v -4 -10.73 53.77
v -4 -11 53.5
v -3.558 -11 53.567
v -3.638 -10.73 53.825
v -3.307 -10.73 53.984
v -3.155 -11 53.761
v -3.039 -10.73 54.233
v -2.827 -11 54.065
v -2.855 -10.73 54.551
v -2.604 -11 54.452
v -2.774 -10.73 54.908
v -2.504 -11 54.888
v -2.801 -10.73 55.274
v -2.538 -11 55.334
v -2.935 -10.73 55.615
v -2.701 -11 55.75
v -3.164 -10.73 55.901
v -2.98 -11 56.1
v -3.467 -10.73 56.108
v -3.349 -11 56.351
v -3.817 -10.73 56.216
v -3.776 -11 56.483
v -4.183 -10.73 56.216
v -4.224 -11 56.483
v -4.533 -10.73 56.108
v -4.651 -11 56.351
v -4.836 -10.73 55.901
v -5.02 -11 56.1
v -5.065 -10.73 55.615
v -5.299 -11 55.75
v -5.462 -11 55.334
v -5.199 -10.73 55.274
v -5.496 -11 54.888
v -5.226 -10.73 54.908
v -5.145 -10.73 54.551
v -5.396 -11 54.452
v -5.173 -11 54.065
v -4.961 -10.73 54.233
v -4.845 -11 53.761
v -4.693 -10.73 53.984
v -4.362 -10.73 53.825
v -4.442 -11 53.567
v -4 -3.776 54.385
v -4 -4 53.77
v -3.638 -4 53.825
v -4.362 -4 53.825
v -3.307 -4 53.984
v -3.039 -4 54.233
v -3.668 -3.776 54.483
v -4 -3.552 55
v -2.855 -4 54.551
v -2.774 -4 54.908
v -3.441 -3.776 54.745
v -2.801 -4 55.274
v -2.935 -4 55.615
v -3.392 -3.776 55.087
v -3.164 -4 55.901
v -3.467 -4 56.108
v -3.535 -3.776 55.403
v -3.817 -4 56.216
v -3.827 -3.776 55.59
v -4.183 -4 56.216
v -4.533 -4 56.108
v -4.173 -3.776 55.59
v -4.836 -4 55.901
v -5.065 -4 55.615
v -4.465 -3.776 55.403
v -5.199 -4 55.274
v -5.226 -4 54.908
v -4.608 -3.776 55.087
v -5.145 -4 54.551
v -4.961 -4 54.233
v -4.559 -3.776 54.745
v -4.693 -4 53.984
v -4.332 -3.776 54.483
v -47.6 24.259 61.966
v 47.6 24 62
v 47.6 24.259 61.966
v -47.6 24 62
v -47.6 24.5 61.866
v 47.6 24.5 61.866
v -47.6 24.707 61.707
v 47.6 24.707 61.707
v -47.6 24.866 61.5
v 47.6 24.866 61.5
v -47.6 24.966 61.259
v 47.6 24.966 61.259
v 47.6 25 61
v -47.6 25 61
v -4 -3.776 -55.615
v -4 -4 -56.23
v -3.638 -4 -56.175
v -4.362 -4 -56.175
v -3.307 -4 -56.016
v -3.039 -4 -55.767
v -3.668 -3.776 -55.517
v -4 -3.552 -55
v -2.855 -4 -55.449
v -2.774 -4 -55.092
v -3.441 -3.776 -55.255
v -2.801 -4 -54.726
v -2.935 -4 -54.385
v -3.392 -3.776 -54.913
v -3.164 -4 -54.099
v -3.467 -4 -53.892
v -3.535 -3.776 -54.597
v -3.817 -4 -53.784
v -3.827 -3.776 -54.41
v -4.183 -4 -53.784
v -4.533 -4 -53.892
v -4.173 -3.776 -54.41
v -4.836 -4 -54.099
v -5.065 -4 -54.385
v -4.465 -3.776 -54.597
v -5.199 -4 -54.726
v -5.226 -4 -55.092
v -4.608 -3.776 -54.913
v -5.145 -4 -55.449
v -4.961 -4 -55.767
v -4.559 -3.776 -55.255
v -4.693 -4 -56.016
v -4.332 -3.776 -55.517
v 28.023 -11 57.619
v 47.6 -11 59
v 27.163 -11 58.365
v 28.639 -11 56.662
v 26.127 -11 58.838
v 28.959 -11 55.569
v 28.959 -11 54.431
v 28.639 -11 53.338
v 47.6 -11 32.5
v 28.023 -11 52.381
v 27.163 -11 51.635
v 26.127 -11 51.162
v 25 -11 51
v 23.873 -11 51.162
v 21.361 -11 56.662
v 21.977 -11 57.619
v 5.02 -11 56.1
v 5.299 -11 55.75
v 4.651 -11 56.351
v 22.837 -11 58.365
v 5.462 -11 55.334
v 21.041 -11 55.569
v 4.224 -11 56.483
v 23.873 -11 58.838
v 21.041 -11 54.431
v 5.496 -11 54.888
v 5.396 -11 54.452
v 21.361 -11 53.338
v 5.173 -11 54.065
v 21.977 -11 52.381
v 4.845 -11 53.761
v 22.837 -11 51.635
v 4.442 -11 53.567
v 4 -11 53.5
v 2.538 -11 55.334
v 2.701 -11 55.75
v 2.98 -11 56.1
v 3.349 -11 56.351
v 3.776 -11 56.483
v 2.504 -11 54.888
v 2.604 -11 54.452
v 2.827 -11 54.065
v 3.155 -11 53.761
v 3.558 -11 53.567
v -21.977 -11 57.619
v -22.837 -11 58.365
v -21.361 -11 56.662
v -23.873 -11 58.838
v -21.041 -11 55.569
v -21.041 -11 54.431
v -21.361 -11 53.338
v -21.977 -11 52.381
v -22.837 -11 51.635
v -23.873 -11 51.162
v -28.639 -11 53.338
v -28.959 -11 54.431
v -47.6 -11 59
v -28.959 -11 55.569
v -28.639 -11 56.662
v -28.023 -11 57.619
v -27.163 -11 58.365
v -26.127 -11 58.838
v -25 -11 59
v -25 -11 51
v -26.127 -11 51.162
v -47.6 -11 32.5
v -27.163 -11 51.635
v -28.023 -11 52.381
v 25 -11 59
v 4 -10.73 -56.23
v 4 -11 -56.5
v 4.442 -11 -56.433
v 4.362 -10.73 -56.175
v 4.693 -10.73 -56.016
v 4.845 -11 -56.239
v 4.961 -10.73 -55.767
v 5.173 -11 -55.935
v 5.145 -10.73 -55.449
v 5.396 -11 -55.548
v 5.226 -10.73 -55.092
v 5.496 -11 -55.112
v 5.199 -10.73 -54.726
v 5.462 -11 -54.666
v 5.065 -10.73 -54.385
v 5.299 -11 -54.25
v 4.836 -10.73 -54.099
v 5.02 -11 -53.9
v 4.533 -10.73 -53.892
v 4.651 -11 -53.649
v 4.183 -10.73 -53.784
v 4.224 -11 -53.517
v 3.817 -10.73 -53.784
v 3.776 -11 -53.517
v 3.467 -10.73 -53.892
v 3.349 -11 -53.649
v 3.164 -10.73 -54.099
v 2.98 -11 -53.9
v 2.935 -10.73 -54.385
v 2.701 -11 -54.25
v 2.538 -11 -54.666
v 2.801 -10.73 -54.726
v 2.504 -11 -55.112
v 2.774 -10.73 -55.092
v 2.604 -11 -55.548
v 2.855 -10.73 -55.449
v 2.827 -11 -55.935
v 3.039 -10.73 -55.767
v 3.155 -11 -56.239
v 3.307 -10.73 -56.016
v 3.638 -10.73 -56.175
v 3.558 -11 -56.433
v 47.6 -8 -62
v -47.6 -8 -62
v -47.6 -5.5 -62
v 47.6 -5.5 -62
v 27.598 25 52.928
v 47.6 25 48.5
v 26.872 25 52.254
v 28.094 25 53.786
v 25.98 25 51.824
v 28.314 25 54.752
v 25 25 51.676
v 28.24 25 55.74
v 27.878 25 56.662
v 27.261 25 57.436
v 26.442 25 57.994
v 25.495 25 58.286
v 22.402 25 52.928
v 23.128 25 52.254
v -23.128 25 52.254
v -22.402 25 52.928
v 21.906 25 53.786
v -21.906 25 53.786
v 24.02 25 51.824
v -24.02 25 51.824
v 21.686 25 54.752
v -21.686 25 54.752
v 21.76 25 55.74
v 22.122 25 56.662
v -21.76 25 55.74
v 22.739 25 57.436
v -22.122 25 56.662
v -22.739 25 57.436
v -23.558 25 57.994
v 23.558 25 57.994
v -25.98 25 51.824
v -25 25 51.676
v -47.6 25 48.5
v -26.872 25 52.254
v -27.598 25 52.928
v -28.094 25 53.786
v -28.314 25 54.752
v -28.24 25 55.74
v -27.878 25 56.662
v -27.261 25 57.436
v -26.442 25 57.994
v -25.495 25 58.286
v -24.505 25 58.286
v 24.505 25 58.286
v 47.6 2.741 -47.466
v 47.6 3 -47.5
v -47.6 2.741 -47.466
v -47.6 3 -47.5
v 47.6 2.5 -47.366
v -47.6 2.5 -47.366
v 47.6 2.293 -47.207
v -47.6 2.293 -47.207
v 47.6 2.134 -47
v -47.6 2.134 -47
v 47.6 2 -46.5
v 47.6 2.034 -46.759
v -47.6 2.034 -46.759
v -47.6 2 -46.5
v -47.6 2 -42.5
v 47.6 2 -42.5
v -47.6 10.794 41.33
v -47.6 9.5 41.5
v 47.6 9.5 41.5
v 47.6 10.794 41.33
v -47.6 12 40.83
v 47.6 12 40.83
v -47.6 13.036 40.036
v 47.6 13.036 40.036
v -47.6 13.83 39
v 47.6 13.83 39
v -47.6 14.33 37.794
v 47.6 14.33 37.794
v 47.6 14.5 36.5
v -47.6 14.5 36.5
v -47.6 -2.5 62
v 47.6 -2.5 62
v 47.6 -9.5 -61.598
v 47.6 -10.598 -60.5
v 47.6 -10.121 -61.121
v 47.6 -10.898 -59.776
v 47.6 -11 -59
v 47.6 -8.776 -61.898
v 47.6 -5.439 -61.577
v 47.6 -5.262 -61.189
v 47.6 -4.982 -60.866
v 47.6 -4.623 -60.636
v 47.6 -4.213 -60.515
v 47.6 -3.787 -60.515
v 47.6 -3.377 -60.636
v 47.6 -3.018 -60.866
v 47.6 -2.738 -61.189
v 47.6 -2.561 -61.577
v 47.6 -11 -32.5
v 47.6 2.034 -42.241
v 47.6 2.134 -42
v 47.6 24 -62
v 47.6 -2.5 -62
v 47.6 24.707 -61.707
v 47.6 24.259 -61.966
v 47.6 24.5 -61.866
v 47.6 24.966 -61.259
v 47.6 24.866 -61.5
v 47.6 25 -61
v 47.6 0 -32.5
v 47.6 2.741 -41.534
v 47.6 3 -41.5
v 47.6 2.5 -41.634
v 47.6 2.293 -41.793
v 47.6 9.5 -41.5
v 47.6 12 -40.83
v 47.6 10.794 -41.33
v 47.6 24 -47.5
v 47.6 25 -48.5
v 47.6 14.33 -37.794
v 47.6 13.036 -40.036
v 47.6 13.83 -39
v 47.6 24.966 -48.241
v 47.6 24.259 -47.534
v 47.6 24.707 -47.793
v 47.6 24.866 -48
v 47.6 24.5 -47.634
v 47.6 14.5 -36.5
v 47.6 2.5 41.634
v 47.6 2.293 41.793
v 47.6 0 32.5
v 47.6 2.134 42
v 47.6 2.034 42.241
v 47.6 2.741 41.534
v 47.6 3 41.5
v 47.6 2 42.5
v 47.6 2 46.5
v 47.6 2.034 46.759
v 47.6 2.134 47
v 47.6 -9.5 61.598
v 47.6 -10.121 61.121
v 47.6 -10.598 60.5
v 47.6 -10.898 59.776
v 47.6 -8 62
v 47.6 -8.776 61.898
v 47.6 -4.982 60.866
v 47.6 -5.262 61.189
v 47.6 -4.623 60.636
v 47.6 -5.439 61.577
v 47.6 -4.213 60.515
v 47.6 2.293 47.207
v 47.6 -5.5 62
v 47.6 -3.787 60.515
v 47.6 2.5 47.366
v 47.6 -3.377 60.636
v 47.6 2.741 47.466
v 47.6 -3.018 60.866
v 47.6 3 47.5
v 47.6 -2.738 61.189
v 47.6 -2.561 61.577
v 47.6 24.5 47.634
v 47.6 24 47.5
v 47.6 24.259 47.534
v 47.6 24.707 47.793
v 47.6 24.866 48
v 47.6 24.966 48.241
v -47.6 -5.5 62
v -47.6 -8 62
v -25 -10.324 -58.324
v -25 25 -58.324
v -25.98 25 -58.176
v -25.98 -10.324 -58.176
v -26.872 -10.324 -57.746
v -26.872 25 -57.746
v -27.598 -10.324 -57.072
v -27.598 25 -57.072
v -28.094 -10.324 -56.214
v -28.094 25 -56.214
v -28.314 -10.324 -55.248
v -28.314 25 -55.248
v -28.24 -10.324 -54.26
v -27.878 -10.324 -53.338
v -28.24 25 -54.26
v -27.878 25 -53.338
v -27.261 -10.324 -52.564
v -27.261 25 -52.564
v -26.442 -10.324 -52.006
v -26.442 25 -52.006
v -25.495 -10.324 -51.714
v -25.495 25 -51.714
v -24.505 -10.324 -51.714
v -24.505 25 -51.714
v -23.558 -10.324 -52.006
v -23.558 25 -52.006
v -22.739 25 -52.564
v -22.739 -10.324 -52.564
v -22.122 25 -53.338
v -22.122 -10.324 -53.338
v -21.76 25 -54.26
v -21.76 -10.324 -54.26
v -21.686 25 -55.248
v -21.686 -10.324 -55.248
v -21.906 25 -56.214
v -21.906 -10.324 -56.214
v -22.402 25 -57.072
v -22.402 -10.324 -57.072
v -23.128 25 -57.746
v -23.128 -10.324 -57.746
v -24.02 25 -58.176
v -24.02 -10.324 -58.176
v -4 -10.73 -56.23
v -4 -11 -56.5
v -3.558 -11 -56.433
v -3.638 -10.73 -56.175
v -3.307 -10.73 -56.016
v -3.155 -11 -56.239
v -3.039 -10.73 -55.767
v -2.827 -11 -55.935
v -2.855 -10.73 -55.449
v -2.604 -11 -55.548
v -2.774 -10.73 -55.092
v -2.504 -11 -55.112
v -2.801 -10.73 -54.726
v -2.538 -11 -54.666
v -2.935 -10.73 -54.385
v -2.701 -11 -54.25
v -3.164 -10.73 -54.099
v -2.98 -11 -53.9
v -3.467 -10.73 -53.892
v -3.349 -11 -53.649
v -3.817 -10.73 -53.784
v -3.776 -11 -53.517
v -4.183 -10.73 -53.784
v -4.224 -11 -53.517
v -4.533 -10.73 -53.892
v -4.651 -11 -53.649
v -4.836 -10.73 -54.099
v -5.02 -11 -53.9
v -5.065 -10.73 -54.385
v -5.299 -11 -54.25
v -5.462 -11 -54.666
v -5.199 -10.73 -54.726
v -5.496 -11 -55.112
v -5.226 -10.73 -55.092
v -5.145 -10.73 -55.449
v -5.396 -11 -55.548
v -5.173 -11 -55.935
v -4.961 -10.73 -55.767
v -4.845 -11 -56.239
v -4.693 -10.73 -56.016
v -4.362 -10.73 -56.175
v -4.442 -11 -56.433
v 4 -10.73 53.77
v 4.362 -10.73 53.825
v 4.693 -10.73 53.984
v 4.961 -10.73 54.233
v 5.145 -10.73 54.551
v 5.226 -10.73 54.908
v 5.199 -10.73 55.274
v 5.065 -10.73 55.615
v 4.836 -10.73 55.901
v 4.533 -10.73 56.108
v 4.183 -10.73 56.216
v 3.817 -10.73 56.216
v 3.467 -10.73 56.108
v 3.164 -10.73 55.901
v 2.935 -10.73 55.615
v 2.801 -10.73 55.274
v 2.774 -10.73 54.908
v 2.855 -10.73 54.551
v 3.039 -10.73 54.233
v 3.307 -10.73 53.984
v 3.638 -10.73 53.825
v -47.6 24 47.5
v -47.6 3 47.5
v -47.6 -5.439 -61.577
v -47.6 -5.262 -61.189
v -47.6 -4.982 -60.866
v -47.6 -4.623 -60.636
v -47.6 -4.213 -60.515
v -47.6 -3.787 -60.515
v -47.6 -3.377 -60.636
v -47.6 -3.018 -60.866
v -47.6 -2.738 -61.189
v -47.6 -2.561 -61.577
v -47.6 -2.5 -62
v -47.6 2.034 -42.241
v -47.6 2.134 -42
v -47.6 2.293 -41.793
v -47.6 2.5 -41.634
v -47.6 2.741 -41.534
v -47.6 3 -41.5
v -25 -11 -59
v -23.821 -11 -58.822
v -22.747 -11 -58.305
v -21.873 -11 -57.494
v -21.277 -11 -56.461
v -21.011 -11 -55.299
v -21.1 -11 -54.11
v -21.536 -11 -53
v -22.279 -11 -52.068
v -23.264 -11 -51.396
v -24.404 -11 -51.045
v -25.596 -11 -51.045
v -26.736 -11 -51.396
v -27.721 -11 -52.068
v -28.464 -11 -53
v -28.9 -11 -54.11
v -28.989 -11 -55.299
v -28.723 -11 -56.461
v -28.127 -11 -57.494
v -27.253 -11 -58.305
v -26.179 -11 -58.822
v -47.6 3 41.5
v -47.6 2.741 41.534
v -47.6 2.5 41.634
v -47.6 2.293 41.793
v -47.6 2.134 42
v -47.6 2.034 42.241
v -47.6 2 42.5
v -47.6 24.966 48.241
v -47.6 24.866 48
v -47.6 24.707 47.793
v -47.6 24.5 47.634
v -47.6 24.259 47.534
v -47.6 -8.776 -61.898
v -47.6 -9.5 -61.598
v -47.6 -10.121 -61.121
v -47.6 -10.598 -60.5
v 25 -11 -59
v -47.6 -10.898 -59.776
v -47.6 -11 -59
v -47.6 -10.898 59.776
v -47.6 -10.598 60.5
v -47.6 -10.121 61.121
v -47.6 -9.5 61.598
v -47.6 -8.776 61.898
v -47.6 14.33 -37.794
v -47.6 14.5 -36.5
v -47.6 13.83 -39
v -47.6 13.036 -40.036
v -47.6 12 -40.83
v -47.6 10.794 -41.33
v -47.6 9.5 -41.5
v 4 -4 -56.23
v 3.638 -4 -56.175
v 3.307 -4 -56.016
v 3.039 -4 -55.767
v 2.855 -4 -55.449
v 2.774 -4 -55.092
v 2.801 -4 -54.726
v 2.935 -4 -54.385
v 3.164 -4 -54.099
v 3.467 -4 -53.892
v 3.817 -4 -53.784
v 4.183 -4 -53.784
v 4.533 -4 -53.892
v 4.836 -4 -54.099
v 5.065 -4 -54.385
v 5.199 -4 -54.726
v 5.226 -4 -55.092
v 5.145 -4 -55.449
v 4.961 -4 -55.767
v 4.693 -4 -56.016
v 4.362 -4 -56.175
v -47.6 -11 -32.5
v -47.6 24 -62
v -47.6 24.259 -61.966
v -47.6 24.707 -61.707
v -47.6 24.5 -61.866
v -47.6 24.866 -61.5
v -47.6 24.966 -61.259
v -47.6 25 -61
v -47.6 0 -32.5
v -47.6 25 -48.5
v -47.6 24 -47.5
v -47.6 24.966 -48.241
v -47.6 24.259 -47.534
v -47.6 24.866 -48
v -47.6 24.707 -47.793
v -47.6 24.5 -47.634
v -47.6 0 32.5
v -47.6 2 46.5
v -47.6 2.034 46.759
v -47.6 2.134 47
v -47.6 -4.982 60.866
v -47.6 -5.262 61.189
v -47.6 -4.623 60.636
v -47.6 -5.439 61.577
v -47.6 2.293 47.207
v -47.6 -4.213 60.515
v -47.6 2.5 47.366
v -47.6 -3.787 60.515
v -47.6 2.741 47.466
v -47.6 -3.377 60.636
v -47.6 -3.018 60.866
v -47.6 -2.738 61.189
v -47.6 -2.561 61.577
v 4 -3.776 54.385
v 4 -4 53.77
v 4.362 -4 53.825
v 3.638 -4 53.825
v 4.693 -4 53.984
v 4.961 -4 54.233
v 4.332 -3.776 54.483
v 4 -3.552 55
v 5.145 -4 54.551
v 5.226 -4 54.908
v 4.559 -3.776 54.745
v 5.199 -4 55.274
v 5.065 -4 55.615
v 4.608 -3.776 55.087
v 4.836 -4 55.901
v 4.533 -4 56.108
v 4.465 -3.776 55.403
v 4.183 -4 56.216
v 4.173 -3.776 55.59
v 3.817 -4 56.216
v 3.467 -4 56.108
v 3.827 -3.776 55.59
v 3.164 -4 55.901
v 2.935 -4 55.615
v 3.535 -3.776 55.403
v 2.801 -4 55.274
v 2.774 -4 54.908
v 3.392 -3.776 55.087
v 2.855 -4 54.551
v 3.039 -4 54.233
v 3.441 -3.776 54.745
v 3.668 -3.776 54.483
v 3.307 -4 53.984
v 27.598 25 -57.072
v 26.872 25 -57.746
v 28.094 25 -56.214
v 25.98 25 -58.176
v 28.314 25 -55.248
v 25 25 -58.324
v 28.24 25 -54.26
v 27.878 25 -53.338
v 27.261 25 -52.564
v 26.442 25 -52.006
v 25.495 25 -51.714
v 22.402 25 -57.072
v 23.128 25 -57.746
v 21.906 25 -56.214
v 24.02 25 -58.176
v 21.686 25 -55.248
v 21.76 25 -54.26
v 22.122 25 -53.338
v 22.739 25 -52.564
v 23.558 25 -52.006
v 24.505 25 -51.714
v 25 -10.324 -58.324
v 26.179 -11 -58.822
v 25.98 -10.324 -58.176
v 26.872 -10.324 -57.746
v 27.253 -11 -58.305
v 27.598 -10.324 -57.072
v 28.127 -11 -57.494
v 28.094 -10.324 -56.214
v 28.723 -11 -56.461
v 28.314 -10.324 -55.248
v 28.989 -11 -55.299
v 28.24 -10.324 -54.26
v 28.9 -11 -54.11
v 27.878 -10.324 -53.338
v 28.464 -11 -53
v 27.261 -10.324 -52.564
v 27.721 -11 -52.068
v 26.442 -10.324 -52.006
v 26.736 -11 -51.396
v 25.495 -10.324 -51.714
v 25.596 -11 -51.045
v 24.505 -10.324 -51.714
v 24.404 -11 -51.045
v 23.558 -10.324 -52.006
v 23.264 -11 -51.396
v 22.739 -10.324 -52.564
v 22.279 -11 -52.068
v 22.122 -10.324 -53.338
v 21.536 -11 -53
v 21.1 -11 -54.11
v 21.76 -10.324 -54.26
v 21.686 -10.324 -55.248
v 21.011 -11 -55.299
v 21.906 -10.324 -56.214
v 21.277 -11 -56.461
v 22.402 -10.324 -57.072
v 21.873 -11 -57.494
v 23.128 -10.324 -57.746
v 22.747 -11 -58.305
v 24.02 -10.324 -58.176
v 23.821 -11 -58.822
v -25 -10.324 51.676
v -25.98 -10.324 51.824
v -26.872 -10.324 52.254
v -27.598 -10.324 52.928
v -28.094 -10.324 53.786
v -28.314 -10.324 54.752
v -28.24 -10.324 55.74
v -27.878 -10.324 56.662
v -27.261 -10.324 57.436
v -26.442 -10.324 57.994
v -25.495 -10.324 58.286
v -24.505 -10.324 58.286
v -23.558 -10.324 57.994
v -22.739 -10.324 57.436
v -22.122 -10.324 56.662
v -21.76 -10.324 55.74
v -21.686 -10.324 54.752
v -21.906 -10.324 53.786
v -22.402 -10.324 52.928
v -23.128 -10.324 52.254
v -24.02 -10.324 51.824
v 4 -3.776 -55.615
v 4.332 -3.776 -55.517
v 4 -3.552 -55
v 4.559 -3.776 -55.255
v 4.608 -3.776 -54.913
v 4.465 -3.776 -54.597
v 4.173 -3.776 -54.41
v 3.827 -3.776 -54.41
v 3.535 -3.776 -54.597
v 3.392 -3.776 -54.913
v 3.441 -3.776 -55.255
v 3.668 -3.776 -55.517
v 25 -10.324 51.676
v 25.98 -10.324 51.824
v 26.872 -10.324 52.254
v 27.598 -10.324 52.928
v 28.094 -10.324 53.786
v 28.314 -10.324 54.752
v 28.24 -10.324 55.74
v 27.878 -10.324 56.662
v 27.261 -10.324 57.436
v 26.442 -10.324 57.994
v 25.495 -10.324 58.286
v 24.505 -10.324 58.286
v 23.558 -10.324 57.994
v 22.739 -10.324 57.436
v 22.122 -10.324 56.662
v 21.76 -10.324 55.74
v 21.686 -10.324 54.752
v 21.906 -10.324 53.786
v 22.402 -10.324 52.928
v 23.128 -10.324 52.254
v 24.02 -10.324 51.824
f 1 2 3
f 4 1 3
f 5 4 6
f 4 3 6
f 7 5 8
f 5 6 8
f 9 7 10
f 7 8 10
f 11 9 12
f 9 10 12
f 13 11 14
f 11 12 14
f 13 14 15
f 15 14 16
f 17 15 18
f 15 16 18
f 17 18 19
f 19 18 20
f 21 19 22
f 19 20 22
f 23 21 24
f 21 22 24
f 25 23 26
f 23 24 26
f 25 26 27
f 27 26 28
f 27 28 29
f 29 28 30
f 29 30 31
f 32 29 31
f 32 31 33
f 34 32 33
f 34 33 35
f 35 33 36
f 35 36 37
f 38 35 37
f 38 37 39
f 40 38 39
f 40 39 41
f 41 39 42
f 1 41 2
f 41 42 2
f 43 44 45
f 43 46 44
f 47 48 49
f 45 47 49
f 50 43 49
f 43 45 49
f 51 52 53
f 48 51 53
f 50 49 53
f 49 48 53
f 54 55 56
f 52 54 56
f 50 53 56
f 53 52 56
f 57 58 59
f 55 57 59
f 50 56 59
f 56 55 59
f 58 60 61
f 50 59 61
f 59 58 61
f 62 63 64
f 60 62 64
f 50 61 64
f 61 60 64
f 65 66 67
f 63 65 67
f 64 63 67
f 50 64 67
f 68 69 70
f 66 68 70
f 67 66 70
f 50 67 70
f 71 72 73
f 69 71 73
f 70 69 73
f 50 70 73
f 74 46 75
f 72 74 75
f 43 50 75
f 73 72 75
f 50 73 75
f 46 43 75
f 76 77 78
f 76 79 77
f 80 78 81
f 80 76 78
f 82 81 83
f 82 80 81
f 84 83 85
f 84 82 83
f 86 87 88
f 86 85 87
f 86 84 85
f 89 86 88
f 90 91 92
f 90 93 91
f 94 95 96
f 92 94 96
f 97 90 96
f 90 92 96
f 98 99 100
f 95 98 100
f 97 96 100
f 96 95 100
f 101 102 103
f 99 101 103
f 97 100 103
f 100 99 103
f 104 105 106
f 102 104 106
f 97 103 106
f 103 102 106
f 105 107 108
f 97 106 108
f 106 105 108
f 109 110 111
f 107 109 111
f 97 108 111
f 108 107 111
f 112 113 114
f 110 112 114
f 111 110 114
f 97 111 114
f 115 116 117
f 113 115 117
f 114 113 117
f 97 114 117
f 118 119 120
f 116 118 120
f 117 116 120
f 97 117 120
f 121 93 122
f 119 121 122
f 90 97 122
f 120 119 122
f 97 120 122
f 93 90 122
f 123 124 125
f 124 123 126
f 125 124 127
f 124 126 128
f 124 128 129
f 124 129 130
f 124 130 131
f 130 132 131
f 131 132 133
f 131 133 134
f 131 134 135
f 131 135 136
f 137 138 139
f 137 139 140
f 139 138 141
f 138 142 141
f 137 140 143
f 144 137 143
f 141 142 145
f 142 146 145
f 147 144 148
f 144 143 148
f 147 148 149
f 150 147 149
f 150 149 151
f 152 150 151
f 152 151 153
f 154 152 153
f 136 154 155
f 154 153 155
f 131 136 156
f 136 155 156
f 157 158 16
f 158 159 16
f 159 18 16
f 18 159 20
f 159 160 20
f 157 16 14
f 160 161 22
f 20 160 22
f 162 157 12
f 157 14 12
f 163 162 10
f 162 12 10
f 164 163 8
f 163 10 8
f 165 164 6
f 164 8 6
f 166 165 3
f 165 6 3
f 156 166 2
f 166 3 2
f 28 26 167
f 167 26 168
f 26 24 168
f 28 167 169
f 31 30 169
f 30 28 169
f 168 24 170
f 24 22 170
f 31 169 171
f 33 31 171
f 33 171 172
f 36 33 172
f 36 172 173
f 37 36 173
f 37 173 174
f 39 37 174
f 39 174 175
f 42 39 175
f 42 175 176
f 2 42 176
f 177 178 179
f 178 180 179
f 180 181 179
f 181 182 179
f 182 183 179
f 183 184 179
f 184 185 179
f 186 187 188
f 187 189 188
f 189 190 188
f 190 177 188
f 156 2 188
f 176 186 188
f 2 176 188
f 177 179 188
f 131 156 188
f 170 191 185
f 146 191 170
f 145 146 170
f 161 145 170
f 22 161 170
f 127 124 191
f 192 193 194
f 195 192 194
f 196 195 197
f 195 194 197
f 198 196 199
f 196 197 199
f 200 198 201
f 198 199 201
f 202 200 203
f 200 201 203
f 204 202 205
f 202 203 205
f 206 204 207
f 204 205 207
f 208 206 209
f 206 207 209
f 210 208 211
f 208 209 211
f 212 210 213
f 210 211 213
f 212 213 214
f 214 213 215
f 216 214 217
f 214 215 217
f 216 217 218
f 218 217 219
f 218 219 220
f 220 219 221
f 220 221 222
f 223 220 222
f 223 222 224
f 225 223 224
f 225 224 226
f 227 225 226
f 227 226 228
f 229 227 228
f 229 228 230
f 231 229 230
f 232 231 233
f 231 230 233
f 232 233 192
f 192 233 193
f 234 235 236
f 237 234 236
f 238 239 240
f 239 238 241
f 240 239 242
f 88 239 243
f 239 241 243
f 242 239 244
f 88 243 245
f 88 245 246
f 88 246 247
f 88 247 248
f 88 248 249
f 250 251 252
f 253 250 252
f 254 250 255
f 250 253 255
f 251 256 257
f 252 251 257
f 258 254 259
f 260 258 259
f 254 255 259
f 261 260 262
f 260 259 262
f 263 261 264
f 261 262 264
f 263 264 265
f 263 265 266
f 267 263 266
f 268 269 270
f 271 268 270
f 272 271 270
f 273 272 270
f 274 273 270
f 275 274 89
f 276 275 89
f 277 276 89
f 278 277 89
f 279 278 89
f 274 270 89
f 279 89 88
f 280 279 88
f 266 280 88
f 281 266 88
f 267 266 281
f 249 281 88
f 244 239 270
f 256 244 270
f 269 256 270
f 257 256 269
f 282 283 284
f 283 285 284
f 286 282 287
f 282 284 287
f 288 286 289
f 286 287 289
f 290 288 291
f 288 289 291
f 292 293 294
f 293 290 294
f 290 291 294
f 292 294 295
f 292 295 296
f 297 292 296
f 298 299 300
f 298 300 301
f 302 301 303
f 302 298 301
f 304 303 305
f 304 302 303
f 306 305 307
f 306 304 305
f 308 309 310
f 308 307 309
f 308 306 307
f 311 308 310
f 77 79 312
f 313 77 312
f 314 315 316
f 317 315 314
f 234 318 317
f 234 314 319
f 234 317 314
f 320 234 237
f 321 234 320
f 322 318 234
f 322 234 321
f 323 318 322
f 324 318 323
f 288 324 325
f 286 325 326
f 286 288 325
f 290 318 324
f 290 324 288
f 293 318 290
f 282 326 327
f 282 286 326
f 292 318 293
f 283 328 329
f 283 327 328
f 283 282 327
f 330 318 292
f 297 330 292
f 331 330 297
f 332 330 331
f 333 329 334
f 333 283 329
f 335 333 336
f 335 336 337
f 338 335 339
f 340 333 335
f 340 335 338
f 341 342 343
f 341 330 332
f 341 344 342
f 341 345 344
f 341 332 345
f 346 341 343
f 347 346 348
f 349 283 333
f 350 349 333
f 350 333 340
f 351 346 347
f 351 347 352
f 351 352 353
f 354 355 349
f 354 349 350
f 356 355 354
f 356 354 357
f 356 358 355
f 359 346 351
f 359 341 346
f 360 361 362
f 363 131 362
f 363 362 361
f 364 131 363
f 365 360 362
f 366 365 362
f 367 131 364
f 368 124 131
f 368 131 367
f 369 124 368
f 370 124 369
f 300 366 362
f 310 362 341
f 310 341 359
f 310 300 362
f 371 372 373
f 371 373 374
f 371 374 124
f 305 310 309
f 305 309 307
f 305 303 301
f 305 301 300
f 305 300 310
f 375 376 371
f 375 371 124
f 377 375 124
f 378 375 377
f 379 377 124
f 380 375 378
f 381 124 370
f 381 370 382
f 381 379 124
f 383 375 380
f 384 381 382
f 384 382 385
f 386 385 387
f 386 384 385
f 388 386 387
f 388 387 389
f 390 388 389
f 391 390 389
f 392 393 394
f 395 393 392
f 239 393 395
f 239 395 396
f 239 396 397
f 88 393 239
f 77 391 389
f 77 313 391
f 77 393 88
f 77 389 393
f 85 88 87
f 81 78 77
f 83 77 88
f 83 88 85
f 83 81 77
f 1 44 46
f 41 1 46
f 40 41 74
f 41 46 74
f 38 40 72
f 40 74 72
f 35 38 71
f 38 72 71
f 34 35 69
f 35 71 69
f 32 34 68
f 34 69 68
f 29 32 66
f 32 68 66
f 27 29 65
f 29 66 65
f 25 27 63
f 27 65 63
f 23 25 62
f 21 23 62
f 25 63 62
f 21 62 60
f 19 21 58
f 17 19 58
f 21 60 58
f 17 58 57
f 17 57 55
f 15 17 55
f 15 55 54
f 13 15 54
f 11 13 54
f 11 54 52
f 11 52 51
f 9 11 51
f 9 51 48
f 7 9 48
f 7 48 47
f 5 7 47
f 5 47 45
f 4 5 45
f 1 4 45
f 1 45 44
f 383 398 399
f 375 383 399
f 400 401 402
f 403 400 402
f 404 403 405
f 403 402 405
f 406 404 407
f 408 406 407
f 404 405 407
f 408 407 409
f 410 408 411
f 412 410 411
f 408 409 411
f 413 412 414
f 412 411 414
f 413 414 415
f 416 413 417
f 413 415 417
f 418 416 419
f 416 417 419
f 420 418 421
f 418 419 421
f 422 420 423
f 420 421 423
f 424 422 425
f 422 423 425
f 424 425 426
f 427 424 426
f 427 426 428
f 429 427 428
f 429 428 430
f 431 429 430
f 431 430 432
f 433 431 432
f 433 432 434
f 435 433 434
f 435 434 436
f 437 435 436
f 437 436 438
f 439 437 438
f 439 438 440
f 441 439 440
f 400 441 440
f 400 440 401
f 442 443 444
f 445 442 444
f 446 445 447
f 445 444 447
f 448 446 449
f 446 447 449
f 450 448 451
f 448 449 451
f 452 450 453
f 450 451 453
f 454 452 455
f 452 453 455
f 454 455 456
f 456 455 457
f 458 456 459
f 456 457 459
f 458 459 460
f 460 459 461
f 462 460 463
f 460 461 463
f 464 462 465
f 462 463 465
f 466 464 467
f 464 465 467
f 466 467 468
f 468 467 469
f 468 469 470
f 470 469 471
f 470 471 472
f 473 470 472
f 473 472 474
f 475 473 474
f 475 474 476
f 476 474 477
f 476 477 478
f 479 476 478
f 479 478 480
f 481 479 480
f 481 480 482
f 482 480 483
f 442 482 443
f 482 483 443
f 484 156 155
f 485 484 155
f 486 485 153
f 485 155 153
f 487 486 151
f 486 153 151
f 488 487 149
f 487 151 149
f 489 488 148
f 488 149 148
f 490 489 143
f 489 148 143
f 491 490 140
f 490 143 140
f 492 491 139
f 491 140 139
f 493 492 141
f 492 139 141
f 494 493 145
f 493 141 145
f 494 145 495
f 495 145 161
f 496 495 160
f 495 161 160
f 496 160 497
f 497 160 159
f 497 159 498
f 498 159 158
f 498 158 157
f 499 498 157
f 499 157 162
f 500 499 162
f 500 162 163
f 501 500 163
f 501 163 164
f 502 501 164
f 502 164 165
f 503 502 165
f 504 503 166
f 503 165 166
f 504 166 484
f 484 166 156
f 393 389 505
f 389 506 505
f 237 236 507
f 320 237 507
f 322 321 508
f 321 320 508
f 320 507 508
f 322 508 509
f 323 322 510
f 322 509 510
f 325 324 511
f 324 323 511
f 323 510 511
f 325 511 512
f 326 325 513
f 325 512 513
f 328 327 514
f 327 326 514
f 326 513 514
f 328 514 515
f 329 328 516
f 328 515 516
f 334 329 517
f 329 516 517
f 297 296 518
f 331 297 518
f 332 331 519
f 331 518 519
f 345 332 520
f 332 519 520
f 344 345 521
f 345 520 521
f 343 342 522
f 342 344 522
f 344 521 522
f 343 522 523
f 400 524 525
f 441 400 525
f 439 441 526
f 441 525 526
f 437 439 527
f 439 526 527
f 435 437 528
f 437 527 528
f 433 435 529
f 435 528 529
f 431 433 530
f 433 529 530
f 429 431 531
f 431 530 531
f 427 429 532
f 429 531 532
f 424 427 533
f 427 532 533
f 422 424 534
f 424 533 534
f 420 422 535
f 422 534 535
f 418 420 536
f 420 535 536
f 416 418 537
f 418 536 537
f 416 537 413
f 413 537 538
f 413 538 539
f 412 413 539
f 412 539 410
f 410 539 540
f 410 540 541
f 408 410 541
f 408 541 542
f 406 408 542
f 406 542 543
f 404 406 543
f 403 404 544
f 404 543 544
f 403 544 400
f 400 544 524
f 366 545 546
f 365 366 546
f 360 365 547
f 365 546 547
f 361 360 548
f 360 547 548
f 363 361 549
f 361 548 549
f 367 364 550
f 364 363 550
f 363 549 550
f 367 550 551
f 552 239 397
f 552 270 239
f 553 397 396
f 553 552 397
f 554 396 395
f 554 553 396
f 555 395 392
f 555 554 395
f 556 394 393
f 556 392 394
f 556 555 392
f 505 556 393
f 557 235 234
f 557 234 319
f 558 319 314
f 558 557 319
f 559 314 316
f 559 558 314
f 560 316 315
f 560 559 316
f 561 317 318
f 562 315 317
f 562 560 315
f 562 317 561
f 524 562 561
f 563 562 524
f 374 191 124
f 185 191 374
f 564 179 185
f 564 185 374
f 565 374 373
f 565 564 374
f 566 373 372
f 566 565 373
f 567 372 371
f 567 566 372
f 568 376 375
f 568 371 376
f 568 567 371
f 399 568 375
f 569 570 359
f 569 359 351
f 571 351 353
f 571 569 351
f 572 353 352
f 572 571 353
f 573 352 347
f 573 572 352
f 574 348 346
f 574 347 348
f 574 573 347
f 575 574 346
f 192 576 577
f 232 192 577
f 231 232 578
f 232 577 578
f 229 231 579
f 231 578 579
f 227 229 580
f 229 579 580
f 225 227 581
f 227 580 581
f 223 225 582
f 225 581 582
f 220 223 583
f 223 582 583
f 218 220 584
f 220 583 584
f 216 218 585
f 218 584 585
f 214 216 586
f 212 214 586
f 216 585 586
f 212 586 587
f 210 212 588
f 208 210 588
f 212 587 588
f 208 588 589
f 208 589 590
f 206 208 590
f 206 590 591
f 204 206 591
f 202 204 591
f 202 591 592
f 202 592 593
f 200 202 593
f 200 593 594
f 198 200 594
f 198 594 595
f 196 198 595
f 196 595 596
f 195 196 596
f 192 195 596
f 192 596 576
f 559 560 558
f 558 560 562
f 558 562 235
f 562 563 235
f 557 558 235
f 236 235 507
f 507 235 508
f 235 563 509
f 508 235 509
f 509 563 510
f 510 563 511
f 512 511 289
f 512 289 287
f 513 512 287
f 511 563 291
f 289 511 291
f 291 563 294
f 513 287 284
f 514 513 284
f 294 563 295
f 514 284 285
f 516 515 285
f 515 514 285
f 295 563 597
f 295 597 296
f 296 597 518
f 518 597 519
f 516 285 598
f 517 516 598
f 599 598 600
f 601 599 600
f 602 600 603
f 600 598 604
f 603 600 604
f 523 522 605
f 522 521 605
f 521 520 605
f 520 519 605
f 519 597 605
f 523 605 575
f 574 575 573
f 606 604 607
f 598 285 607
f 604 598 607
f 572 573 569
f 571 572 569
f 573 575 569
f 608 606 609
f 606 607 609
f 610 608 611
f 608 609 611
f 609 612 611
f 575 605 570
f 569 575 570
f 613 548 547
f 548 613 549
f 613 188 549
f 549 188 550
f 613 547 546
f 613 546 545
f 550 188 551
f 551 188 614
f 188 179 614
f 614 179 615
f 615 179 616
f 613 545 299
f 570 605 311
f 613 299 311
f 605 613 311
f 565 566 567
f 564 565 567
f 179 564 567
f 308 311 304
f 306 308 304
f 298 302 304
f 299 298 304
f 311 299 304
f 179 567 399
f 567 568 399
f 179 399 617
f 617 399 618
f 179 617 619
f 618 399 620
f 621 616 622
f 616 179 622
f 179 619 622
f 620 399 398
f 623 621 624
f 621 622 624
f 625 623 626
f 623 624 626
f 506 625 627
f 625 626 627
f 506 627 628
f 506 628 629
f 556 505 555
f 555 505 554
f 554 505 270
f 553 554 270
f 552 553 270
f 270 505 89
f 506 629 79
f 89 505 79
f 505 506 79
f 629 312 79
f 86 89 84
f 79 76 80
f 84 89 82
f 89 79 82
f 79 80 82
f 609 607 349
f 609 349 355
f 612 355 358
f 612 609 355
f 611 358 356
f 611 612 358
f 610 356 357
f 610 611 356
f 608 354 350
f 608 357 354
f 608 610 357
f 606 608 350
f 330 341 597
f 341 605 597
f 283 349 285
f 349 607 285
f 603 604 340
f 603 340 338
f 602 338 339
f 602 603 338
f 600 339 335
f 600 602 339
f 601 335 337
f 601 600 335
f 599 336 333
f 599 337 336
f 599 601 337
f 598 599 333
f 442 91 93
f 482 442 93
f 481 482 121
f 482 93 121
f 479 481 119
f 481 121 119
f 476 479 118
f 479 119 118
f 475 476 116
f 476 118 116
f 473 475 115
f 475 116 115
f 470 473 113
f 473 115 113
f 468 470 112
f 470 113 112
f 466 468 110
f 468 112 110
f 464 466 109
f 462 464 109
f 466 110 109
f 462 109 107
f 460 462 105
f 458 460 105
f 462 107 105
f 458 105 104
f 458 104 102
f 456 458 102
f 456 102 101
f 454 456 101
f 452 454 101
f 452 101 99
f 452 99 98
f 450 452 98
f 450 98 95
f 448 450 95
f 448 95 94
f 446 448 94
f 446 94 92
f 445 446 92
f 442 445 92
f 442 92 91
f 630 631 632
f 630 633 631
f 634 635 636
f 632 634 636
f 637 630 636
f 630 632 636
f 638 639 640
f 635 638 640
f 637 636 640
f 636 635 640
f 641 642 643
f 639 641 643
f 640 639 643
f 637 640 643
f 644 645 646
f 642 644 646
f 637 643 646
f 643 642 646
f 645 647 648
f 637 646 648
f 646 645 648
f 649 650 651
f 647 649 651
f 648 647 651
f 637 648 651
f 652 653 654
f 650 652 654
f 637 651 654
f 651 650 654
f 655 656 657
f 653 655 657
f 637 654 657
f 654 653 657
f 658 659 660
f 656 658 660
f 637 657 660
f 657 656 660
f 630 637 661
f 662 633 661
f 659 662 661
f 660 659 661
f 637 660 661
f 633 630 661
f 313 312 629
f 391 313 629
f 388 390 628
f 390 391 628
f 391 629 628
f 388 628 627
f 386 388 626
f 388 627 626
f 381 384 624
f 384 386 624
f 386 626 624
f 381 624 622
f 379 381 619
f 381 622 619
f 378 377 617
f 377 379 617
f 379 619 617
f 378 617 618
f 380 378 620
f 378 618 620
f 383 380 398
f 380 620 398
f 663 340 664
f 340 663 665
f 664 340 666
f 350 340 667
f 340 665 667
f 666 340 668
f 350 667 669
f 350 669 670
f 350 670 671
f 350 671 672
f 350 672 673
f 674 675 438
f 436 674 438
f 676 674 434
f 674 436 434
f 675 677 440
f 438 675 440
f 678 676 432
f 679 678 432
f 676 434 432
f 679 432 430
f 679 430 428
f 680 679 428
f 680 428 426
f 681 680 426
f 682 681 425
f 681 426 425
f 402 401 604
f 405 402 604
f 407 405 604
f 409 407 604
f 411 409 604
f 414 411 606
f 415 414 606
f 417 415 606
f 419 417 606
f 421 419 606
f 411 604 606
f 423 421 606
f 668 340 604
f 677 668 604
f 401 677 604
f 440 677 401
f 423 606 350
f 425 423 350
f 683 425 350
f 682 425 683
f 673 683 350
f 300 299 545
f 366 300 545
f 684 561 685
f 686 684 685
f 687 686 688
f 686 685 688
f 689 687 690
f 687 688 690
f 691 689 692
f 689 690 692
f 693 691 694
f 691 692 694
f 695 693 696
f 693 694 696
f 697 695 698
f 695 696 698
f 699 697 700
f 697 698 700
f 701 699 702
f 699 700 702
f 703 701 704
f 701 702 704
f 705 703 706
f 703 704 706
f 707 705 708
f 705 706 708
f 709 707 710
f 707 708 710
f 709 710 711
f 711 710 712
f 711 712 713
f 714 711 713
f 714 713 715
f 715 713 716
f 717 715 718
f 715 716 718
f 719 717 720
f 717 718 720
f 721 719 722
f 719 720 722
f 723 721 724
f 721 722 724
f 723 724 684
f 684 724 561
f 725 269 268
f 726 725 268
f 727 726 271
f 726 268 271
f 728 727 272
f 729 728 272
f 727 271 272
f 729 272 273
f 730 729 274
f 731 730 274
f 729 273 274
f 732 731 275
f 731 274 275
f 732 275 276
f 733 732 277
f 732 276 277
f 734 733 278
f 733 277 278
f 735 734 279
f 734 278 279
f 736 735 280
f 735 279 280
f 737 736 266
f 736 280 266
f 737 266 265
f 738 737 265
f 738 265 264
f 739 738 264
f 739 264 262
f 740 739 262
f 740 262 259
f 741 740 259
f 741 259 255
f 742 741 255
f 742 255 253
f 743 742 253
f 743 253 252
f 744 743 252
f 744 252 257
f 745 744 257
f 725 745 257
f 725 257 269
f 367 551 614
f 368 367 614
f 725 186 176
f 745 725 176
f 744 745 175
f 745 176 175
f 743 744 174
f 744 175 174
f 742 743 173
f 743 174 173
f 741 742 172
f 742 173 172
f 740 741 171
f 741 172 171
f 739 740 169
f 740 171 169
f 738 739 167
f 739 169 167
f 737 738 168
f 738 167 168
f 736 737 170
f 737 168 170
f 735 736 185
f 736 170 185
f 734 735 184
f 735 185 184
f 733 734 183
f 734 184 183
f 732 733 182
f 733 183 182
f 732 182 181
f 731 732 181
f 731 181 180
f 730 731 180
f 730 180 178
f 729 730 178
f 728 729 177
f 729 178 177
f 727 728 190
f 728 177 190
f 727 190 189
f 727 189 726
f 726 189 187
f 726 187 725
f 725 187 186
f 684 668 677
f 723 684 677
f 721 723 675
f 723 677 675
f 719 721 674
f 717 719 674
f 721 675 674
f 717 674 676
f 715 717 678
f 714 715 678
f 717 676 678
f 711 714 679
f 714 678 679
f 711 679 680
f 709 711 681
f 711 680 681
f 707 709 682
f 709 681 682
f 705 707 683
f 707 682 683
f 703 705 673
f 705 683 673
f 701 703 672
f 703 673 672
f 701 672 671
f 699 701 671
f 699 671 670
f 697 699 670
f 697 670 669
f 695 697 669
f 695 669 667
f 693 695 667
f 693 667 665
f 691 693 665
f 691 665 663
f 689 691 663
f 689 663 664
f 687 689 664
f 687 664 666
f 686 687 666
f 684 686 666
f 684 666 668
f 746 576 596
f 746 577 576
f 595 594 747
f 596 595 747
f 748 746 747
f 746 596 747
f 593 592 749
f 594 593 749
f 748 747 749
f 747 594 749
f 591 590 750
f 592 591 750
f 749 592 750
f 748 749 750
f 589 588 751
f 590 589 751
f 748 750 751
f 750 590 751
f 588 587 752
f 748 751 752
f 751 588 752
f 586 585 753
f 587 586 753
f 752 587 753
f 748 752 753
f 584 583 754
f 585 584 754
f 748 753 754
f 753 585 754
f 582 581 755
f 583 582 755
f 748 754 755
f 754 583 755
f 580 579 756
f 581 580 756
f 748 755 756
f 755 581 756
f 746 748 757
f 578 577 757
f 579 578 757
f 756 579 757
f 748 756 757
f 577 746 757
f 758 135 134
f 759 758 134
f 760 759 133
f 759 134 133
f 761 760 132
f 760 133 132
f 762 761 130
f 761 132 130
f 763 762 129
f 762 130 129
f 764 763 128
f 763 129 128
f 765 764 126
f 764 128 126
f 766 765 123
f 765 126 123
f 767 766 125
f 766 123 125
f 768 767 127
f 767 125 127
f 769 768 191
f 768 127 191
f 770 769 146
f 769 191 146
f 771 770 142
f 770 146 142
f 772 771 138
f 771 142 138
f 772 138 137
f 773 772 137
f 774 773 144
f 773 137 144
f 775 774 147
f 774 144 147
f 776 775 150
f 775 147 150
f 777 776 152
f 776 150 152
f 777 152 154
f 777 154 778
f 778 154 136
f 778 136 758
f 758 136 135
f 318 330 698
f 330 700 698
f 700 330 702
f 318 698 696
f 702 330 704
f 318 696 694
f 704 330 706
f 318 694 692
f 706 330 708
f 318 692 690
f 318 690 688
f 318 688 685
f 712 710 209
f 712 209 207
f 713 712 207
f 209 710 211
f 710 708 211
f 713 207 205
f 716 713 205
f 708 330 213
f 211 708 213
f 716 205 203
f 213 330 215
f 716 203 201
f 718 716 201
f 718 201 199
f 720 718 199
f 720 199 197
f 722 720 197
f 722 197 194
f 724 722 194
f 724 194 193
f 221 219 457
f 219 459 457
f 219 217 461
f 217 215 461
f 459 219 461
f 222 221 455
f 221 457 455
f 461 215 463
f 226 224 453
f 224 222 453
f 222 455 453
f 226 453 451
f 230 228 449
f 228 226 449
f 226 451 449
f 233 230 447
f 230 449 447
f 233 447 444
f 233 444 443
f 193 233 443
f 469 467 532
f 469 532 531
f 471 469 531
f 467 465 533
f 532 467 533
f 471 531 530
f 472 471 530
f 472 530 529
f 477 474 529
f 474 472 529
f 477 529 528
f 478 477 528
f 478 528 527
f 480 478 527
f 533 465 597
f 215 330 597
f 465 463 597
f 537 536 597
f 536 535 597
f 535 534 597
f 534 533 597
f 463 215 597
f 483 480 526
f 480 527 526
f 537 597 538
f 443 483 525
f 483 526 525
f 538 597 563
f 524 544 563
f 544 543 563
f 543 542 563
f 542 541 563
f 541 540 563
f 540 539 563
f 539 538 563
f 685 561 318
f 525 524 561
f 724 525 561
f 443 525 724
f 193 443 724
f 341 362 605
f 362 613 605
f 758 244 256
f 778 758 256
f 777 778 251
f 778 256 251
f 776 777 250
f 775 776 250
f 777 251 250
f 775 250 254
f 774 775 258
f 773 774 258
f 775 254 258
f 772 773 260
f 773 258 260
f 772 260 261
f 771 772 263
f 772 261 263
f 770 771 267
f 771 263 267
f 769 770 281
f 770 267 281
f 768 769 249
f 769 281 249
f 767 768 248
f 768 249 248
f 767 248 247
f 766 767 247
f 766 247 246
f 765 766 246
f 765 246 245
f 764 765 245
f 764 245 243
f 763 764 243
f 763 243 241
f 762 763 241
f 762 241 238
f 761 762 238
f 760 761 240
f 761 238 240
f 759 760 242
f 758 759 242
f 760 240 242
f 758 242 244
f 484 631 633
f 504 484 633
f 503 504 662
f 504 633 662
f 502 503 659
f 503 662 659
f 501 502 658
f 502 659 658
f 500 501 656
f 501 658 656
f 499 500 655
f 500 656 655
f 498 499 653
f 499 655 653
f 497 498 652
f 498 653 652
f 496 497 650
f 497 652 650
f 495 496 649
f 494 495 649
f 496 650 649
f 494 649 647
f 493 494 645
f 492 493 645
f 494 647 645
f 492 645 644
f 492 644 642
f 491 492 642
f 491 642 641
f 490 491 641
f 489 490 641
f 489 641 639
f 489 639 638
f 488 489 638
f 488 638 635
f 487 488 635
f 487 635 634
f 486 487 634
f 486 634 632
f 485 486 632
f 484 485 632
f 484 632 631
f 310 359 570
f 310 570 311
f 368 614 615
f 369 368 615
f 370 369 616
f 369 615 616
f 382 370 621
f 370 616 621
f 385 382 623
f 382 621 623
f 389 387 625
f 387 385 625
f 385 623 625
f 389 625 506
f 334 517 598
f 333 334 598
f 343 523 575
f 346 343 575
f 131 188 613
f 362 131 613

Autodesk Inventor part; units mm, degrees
sketch "Sketch_1" plane through (0, 0, 0) normal (1, 0, 0) x (0, 1, 0)
  line L0 (24, 62) -> (-2.5, 62)
  arc A0 (-5.5, 62) -> (-2.5, 62) centre (-4, 62) ccw
  line L1 (-5.5, 62) -> (-8, 62)
  arc A1 (-8, 62) -> (-11, 59) centre (-8, 59) ccw
  line L2 (-11, 59) -> (-11, 32.5)
  line L3 (-11, 32.5) -> (0, 32.5)
  line L4 (0, 32.5) -> (0, -32.5)
  line L5 (0, -32.5) -> (-11, -32.5)
  line L6 (-11, -32.5) -> (-11, -59)
  arc A2 (-11, -59) -> (-8, -62) centre (-8, -59) ccw
  line L7 (-8, -62) -> (-5.5, -62)
  arc A3 (-2.5, -62) -> (-5.5, -62) centre (-4, -62) ccw
  line L8 (-2.5, -62) -> (24, -62)
  arc A4 (24, -62) -> (25, -61) centre (24, -61) ccw
  line L9 (25, -61) -> (25, -48.5)
  arc A5 (25, -48.5) -> (24, -47.5) centre (24, -48.5) ccw
  line L10 (24, -47.5) -> (3, -47.5)
  arc A6 (2, -46.5) -> (3, -47.5) centre (3, -46.5) ccw
  line L11 (2, -46.5) -> (2, -42.5)
  arc A7 (3, -41.5) -> (2, -42.5) centre (3, -42.5) ccw
  line L12 (3, -41.5) -> (9.5, -41.5)
  arc A8 (9.5, -41.5) -> (14.5, -36.5) centre (9.5, -36.5) ccw
  line L13 (14.5, -36.5) -> (14.5, 36.5)
  arc A9 (14.5, 36.5) -> (9.5, 41.5) centre (9.5, 36.5) ccw
  line L14 (9.5, 41.5) -> (3, 41.5)
  arc A10 (2, 42.5) -> (3, 41.5) centre (3, 42.5) ccw
  line L15 (2, 42.5) -> (2, 46.5)
  arc A11 (3, 47.5) -> (2, 46.5) centre (3, 46.5) ccw
  line L16 (3, 47.5) -> (24, 47.5)
  arc A12 (24, 47.5) -> (25, 48.5) centre (24, 48.5) ccw
  line L17 (25, 48.5) -> (25, 61)
  arc A13 (25, 61) -> (24, 62) centre (24, 61) ccw
extrude "Extrusion1" add sketch "Sketch_1" along normal mid plane 95.2
sketch "Sketch2" plane through (-47.6, -11, 59) normal (0, -1, 0) x (1, 0, 0)
  point P0 (22.6, -4)
hole "Drilling 1" at (-25, -11, 55) direction (0, 1, 0) diameter 6.647 depth 36 countersink diameter 8 countersink angle 90 thread size "M8x1.25" class "6H" standard "ISO Metric profile"
pattern_linear "Rectangular Pattern1" count 2 spacing 50 along (1, 0, 0) count 2 spacing 110 along (0, 0, -1) of "Drilling 1"
sketch "Sketch3" plane through (-47.6, -11, 32.5) normal (0, -1, 0) x (1, 0, 0)
  point P0 (43.6, 22.5)
hole "Drilling 2" at (-4, -11, 55) direction (0, 1, 0) diameter 2.459 depth 7 tip angle 140 countersink diameter 3 countersink angle 90 thread size "M3x0.5" class "6H" standard "ISO Metric profile"
pattern_linear "Rectangular Pattern2" count 2 spacing 8 along (1, 0, 0) count 2 spacing 110 along (0, 0, -1) of "Drilling 2"
ref_plane "slider_spacer_sensor_dog_XY" through (0, -11, 55) normal (0, 1, 0) x (1, 0, 0)
ref_plane "slider_spacer_sensor_dog_YZ" through (0, -11, 55) normal (1, 0, 0) x (0, 0, -1)
ref_plane "slider_spacer_sensor_dog_ZX" through (0, -11, 55) normal (0, 0, -1) x (0, 1, 0)
ref_plane "slider_spacer_slider_XY" through (0, 0, 0) normal (0, 1, 0) x (1, 0, 0)
ref_plane "slider_spacer_slider_YZ" through (0, 0, 0) normal (1, 0, 0) x (0, 0, -1)
ref_plane "slider_spacer_slider_ZX" through (0, 0, 0) normal (0, 0, -1) x (0, 1, 0)
properties part number "KR55-A-Slider Spacer"
